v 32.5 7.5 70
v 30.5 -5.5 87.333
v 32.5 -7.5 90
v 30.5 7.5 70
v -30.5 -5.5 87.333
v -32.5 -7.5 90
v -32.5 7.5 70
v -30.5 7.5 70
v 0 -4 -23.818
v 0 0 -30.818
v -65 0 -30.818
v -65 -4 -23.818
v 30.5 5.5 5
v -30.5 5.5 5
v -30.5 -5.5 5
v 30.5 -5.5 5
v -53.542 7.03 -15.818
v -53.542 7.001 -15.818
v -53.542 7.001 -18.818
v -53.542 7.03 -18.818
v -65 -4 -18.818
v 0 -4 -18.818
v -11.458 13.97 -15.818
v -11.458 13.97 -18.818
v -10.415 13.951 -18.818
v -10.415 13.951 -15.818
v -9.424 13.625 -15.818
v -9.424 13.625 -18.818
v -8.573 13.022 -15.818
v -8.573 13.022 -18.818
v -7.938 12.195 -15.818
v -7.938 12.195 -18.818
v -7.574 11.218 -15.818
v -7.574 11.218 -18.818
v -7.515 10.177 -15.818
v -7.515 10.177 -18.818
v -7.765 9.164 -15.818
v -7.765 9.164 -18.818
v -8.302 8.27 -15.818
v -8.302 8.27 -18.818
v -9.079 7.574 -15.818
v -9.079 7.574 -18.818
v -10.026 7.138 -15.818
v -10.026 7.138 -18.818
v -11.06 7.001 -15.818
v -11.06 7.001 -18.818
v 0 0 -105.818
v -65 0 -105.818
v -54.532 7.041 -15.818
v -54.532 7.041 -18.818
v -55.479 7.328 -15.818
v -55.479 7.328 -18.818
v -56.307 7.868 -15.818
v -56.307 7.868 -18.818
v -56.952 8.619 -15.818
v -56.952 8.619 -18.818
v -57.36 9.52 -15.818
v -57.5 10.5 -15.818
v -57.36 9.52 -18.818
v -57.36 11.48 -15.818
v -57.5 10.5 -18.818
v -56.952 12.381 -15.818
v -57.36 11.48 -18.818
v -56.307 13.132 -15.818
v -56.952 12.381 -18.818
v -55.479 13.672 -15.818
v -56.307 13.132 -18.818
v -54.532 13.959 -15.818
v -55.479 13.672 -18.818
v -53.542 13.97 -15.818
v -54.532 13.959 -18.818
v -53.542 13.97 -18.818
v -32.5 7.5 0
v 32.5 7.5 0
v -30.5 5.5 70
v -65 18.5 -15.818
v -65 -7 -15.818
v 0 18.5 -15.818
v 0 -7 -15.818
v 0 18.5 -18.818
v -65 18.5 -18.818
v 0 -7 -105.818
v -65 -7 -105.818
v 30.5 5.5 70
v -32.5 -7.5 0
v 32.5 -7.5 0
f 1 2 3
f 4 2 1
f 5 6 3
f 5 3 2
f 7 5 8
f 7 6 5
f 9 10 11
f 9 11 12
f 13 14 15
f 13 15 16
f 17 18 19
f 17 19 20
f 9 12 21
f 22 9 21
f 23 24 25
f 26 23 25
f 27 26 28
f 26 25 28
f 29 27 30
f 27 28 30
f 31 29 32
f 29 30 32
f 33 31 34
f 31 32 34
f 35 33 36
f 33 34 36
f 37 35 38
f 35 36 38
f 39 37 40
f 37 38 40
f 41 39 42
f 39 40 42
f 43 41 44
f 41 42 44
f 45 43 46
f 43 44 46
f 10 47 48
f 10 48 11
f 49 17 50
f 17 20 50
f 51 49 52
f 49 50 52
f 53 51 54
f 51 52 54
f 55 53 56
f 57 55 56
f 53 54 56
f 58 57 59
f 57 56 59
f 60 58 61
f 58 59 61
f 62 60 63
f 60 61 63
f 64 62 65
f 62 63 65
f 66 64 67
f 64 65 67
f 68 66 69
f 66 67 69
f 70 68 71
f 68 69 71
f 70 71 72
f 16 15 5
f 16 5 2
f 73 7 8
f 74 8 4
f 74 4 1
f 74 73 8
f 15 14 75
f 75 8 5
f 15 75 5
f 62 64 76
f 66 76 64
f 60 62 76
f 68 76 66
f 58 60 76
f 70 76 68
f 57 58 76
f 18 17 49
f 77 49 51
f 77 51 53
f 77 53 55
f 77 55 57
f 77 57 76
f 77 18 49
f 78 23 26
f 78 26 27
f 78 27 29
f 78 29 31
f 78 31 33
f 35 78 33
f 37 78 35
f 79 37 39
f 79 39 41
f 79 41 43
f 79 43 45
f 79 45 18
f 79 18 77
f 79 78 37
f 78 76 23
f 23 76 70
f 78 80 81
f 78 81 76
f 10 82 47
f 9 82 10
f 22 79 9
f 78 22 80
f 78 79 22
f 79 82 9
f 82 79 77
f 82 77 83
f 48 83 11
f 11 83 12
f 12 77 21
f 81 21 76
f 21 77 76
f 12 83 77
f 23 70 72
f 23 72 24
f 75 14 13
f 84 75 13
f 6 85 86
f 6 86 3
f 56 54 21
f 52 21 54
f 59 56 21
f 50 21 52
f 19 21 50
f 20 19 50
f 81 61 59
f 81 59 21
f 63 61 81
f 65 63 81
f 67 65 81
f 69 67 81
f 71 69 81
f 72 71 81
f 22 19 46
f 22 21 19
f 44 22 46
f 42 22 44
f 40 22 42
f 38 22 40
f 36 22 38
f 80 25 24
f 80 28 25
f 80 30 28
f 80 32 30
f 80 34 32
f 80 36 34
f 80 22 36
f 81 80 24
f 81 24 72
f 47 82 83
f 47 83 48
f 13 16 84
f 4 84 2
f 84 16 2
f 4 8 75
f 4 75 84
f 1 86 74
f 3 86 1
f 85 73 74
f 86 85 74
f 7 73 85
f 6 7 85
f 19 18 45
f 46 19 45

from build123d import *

# Parameters (mm, degrees)
F0_W      = 65
F0_H      = 15
F1_DEPTH  = 5
F2_W      = 65
F2_H      = 15
F2_W_2    = 61
F2_H_2    = 11
F3_DEPTH  = 65
F5_DEPTH  = 2
F7_DEPTH  = 2
F8_W      = 61
F8_H      = 2
F9_DEPTH  = 20
F10_DEPTH = 63.001
F12_DEPTH = 65
F14_D     = 7
F15_W     = 42.4820806249
F15_H     = 6.9694081779
F16_DEPTH = 90.001


with BuildPart() as f1:
    # F0 (on Top) → F1 (new body)
    with BuildSketch(Plane.XY):
        Rectangle(F0_W, F0_H)
    extrude(amount=F1_DEPTH)

    # F2 (on face) → F3 (join)
    with BuildSketch(Plane.XY.offset(5)):
        Rectangle(F2_W, F2_H)
        Rectangle(F2_W_2, F2_H_2, mode=Mode.SUBTRACT)
    extrude(amount=F3_DEPTH)

    # F4 (on face) → F5 (join)
    with BuildSketch(Plane.YZ.offset(32.5)):
        Polygon((-7.5, 90), (-7.5, 70), (7.5, 70), align=None)
    extrude(amount=-F5_DEPTH)

    # F6 (on face) → F7 (join)
    with BuildSketch(Plane(origin=(-32.5, 0, 0), x_dir=(0, -1, 0), z_dir=(-1, 0, 0))):
        Polygon((-7.5, 70), (7.5, 70), (7.5, 90), align=None)
    extrude(amount=-F7_DEPTH)

    # F8 (on face) → F9 (join)
    with BuildSketch(Plane.XY.offset(70)):
        with Locations((0, -6.5)):
            Rectangle(F8_W, F8_H)
    extrude(amount=F9_DEPTH)

    # F10 (cut, through all): a face of the model
    f10_faces = [f1.faces().sort_by_distance(p)[0] for p in [
        (30.5, -6.1666666667, 89.1111111111),
    ]]
    extrude(f10_faces, amount=-F10_DEPTH, mode=Mode.SUBTRACT)


with BuildPart() as f12:
    # F11 (on Right) → F12 (new body)
    with BuildSketch(Plane.YZ):
        Polygon((18.5, -15.8177633183), (-7, -15.8177633183), (-7, -105.8177633183), (0, -105.8177633183), (0, -30.8177633183), (-4, -23.8177633183), (-4, -18.8177633183), (18.5, -18.8177633183), align=None)
    extrude(amount=-F12_DEPTH)

    # F14 (through all)
    with Locations(Plane.XY.offset(-15.8177633183)):
        with Locations((-54, 10.5), (-11, 10.5)):
            Hole(F14_D / 2)

    # F15 (on face) → F16 (cut, through all)
    with BuildSketch(Plane.XY.offset(-15.8177633183)):
        with Locations((-32.3011059811, 10.485219539)):
            Rectangle(F15_W, F15_H)
    extrude(amount=-F16_DEPTH, mode=Mode.SUBTRACT)


solid = Compound([f1.part, f12.part])
